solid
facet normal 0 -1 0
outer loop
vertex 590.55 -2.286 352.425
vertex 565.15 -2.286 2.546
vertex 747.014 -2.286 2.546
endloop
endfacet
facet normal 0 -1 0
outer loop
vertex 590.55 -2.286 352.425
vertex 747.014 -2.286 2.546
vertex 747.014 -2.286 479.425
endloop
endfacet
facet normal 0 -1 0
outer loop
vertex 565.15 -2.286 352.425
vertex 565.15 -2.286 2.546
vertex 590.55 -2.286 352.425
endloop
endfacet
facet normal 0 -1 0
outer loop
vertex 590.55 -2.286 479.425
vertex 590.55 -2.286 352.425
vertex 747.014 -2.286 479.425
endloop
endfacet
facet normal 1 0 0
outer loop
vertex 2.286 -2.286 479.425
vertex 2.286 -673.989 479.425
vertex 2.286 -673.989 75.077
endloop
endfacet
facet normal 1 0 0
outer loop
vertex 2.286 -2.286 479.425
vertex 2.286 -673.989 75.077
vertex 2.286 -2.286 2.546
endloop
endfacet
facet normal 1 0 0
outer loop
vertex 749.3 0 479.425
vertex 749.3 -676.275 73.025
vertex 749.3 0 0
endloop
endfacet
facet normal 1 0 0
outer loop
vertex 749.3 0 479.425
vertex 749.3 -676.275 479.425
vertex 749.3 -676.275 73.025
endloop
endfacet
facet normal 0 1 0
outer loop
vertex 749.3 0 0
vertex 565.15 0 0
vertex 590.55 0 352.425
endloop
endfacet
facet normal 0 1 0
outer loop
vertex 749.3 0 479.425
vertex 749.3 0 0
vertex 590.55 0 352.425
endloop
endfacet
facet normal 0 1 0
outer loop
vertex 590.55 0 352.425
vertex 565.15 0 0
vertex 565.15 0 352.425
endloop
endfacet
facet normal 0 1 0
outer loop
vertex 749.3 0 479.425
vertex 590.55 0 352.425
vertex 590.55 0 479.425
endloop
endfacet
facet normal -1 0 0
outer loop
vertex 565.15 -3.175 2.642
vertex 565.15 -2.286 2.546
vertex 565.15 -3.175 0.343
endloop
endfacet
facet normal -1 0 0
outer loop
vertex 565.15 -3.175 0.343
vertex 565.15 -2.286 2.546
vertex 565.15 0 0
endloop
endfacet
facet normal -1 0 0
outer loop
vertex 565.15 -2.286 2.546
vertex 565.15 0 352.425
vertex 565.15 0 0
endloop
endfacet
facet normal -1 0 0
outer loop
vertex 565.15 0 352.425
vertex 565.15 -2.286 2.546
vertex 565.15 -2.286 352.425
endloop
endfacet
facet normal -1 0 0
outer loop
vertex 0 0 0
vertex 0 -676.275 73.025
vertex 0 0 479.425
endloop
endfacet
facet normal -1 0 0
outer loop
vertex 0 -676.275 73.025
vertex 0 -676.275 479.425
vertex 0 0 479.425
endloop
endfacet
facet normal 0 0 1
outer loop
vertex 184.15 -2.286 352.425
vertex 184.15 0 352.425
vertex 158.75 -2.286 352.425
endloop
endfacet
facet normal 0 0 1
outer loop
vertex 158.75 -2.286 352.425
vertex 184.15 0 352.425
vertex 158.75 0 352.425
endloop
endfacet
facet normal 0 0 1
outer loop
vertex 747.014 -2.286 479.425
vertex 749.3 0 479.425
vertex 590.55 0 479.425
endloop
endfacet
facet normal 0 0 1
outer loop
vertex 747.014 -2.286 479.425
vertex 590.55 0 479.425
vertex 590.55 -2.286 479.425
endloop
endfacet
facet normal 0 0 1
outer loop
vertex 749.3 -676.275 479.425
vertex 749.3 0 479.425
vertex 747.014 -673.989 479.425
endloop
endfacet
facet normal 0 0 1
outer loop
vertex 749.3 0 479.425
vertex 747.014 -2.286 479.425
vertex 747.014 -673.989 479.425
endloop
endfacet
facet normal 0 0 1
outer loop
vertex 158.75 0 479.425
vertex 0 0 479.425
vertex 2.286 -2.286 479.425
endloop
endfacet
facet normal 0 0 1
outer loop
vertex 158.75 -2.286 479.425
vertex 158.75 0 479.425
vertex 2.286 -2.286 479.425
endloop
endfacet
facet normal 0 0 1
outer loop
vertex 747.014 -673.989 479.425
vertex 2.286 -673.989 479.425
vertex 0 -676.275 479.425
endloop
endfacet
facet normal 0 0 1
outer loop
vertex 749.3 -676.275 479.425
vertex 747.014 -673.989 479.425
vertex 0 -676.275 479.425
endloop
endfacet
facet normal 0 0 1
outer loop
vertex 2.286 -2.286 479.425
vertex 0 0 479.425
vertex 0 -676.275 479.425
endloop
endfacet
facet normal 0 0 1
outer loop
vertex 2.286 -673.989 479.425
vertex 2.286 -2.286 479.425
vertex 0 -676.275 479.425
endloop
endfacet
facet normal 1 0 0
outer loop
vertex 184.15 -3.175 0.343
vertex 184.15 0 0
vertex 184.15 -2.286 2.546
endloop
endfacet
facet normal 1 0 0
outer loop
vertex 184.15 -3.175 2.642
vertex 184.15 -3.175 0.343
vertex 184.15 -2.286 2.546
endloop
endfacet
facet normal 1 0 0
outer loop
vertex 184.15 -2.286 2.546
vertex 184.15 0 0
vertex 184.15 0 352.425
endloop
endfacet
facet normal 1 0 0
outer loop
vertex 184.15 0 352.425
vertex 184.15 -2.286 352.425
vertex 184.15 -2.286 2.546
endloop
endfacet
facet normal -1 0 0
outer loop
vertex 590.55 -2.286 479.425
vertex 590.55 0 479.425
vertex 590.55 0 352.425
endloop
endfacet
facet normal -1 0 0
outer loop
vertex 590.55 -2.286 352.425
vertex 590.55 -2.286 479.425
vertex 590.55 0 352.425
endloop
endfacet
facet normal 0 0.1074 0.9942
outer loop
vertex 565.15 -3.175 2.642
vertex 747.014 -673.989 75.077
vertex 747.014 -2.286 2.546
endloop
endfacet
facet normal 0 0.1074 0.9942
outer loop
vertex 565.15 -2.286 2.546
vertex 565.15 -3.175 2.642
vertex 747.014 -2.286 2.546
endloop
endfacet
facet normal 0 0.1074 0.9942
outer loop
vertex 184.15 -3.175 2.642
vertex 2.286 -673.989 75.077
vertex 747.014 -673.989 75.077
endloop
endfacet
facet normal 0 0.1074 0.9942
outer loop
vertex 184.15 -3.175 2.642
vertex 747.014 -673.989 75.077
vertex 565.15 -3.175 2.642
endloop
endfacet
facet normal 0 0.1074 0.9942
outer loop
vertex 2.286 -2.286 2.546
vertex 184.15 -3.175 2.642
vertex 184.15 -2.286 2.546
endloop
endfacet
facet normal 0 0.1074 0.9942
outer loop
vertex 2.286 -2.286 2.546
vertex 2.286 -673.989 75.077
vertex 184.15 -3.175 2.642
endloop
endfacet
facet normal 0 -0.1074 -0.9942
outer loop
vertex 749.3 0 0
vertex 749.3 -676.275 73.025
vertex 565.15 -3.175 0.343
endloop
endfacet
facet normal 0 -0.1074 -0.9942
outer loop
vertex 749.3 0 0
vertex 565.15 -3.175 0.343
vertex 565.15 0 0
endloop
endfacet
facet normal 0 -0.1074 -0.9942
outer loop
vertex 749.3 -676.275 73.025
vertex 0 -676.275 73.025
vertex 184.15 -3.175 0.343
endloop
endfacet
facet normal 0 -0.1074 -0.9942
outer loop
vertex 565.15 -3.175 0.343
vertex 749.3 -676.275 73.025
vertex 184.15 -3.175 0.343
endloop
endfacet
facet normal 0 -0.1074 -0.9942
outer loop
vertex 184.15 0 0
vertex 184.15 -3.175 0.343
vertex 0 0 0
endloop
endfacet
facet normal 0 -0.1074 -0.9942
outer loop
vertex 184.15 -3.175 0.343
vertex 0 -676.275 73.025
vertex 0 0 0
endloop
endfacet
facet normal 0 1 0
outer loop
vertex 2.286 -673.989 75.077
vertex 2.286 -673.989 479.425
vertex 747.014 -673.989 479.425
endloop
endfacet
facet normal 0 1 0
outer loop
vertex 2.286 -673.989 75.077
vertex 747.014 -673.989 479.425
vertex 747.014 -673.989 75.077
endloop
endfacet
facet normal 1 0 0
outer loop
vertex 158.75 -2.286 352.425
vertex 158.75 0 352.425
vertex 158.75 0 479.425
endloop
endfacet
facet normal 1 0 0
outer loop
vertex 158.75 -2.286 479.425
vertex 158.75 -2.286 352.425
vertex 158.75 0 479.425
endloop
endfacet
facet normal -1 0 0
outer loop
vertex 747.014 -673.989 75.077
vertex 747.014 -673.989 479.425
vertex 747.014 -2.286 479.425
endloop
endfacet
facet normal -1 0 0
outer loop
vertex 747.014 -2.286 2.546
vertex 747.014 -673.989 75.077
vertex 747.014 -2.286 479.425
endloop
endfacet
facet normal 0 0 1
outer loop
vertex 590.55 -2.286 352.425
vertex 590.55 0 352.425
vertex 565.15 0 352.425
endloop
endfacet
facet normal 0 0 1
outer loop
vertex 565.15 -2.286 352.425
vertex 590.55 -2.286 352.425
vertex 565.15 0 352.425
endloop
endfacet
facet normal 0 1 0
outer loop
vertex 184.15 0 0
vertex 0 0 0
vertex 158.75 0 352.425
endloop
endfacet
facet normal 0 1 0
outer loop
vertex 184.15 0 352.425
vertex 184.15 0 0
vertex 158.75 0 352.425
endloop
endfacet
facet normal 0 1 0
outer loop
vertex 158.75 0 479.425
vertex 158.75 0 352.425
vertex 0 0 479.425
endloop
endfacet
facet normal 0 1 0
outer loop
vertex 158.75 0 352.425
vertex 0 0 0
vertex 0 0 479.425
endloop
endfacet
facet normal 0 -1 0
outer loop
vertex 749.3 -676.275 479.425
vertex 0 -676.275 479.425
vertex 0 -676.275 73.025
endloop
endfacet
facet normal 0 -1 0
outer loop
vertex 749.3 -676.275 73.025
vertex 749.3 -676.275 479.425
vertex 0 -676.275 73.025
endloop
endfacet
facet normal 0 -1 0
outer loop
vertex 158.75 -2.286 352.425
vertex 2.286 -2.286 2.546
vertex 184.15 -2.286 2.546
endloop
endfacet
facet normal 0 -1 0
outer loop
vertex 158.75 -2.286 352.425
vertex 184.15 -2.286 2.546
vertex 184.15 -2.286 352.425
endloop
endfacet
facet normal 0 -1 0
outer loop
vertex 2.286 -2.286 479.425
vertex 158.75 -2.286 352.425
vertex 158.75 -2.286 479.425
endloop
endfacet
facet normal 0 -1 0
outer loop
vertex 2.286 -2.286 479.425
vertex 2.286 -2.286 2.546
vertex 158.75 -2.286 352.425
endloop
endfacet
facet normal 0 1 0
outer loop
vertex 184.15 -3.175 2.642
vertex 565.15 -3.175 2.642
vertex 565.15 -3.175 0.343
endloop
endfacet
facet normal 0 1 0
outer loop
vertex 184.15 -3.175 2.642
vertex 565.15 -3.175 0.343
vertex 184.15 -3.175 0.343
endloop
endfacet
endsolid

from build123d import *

# Parameters (mm, degrees)
F1_DEPTH = 749.3
F2_T     = -2.286
F4_DEPTH = 3.175


with BuildPart() as f1:
    # F0 (on Right) → F1 (new body)
    with BuildSketch(Plane.YZ):
        Polygon((-676.275, 73.025), (0, 0), (0, 479.425), (-676.275, 479.425), align=None)
    extrude(amount=F1_DEPTH)

    # F2
    f2_openings = [f1.faces().sort_by_distance(p)[0] for p in [
        (374.65, -338.1375, 479.425),
    ]]
    offset(amount=F2_T, openings=f2_openings)

    # F3 (on face) → F4 (cut)
    with BuildSketch(Plane(origin=(0, 0, 0), x_dir=(-1, 0, 0), z_dir=(0, 1, 0))):
        Polygon((-158.75, 479.425), (-590.55, 479.425), (-590.55, 352.425), (-565.15, 352.425), (-565.15, 0), (-184.15, 0), (-184.15, 352.425), (-158.75, 352.425), align=None)
    extrude(amount=-F4_DEPTH, mode=Mode.SUBTRACT)


solid = f1.part
